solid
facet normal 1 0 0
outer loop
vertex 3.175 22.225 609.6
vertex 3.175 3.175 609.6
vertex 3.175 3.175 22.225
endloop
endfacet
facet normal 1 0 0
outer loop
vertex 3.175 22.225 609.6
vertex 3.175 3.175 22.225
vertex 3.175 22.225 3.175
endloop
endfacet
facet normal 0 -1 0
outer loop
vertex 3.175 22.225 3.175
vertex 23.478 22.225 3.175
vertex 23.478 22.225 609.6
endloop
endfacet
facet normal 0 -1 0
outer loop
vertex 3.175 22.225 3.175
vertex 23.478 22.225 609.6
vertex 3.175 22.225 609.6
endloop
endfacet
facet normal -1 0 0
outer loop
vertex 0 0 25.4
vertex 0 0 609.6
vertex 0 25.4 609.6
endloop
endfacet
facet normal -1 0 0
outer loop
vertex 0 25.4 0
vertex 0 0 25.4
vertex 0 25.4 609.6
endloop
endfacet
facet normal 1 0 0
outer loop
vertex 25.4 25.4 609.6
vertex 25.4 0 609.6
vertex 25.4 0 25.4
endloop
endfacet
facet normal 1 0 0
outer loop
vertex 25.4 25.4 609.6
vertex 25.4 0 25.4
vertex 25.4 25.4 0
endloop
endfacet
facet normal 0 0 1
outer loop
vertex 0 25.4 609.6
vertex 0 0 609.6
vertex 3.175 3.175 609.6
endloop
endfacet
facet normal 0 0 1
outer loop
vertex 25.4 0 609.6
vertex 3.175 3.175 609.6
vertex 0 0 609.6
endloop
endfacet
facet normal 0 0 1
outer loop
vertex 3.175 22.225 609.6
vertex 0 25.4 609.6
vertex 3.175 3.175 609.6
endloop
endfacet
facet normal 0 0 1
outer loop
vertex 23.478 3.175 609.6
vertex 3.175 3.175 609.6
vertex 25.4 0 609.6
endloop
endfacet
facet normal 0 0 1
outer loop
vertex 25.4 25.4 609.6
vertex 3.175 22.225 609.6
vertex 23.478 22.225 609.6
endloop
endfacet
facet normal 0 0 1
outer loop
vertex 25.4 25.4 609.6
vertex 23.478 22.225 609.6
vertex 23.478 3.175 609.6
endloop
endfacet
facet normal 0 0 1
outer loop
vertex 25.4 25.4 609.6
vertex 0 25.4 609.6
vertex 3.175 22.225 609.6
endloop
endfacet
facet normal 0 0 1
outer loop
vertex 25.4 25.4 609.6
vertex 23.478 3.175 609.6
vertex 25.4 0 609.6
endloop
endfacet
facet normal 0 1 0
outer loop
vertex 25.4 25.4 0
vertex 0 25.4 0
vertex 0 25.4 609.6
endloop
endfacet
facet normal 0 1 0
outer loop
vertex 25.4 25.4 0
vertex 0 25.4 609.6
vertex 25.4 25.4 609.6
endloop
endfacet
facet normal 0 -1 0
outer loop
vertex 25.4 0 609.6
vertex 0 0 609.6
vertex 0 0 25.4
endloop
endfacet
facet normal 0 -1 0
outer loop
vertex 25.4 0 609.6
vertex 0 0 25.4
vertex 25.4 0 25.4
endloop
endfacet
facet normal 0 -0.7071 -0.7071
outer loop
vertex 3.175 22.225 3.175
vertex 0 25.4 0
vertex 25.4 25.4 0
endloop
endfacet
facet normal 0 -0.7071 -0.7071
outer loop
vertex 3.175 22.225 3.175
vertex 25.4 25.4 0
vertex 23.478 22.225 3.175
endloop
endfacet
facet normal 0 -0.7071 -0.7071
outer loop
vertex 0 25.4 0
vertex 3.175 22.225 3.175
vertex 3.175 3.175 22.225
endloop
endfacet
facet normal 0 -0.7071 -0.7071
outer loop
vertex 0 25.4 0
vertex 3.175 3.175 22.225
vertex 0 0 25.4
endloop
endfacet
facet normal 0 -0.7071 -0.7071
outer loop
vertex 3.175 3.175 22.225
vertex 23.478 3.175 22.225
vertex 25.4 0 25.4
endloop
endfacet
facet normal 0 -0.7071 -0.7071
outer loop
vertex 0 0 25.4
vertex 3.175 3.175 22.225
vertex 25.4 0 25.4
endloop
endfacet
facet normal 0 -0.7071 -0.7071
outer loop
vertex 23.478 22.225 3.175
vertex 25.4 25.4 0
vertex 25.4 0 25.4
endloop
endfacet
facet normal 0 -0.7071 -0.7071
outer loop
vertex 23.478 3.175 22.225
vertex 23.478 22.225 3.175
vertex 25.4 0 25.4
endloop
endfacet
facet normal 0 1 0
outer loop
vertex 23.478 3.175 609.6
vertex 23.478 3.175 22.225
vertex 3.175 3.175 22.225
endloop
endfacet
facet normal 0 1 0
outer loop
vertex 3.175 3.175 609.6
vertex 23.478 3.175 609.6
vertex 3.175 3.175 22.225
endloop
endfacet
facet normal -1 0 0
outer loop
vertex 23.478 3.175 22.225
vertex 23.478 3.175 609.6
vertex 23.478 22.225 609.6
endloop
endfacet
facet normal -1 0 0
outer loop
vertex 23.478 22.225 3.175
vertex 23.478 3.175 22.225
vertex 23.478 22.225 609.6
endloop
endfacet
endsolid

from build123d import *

# Parameters (mm, degrees)
SKETCH1_W           = 25.4
SKETCH1_H           = 25.4
BOSS_EXTRUDE2_DEPTH = 609.6
SKETCH2_W           = 20.302766191
SKETCH2_H           = 19.05
CUT_EXTRUDE1_DEPTH  = 611.657416233
CUT_EXTRUDE2_DEPTH  = 611.657416233


with BuildPart() as part:
    # Sketch1 → Boss-Extrude2 (new body)
    with BuildSketch(Plane.XY):
        with Locations((12.7, 12.7)):
            Rectangle(SKETCH1_W, SKETCH1_H)
    extrude(amount=BOSS_EXTRUDE2_DEPTH)

    # Sketch2 → Cut-Extrude1 (cut, through all)
    with BuildSketch(Plane(origin=(0, 0, 0), x_dir=(-1, 0, 0), z_dir=(0, 0, -1))):
        with Locations((-13.326383096, 12.7)):
            Rectangle(SKETCH2_W, SKETCH2_H)
    extrude(amount=-CUT_EXTRUDE1_DEPTH, mode=Mode.SUBTRACT)

    # Sketch3 → Cut-Extrude2 (cut, through all)
    with BuildSketch(Plane(origin=(25.4, 0, 0), x_dir=(0, 0, -1), z_dir=(1, 0, 0))):
        Polygon((0, 25.4), (-25.4, 0), (0, 0), align=None)
    extrude(amount=-CUT_EXTRUDE2_DEPTH, mode=Mode.SUBTRACT)


solid = part.part
